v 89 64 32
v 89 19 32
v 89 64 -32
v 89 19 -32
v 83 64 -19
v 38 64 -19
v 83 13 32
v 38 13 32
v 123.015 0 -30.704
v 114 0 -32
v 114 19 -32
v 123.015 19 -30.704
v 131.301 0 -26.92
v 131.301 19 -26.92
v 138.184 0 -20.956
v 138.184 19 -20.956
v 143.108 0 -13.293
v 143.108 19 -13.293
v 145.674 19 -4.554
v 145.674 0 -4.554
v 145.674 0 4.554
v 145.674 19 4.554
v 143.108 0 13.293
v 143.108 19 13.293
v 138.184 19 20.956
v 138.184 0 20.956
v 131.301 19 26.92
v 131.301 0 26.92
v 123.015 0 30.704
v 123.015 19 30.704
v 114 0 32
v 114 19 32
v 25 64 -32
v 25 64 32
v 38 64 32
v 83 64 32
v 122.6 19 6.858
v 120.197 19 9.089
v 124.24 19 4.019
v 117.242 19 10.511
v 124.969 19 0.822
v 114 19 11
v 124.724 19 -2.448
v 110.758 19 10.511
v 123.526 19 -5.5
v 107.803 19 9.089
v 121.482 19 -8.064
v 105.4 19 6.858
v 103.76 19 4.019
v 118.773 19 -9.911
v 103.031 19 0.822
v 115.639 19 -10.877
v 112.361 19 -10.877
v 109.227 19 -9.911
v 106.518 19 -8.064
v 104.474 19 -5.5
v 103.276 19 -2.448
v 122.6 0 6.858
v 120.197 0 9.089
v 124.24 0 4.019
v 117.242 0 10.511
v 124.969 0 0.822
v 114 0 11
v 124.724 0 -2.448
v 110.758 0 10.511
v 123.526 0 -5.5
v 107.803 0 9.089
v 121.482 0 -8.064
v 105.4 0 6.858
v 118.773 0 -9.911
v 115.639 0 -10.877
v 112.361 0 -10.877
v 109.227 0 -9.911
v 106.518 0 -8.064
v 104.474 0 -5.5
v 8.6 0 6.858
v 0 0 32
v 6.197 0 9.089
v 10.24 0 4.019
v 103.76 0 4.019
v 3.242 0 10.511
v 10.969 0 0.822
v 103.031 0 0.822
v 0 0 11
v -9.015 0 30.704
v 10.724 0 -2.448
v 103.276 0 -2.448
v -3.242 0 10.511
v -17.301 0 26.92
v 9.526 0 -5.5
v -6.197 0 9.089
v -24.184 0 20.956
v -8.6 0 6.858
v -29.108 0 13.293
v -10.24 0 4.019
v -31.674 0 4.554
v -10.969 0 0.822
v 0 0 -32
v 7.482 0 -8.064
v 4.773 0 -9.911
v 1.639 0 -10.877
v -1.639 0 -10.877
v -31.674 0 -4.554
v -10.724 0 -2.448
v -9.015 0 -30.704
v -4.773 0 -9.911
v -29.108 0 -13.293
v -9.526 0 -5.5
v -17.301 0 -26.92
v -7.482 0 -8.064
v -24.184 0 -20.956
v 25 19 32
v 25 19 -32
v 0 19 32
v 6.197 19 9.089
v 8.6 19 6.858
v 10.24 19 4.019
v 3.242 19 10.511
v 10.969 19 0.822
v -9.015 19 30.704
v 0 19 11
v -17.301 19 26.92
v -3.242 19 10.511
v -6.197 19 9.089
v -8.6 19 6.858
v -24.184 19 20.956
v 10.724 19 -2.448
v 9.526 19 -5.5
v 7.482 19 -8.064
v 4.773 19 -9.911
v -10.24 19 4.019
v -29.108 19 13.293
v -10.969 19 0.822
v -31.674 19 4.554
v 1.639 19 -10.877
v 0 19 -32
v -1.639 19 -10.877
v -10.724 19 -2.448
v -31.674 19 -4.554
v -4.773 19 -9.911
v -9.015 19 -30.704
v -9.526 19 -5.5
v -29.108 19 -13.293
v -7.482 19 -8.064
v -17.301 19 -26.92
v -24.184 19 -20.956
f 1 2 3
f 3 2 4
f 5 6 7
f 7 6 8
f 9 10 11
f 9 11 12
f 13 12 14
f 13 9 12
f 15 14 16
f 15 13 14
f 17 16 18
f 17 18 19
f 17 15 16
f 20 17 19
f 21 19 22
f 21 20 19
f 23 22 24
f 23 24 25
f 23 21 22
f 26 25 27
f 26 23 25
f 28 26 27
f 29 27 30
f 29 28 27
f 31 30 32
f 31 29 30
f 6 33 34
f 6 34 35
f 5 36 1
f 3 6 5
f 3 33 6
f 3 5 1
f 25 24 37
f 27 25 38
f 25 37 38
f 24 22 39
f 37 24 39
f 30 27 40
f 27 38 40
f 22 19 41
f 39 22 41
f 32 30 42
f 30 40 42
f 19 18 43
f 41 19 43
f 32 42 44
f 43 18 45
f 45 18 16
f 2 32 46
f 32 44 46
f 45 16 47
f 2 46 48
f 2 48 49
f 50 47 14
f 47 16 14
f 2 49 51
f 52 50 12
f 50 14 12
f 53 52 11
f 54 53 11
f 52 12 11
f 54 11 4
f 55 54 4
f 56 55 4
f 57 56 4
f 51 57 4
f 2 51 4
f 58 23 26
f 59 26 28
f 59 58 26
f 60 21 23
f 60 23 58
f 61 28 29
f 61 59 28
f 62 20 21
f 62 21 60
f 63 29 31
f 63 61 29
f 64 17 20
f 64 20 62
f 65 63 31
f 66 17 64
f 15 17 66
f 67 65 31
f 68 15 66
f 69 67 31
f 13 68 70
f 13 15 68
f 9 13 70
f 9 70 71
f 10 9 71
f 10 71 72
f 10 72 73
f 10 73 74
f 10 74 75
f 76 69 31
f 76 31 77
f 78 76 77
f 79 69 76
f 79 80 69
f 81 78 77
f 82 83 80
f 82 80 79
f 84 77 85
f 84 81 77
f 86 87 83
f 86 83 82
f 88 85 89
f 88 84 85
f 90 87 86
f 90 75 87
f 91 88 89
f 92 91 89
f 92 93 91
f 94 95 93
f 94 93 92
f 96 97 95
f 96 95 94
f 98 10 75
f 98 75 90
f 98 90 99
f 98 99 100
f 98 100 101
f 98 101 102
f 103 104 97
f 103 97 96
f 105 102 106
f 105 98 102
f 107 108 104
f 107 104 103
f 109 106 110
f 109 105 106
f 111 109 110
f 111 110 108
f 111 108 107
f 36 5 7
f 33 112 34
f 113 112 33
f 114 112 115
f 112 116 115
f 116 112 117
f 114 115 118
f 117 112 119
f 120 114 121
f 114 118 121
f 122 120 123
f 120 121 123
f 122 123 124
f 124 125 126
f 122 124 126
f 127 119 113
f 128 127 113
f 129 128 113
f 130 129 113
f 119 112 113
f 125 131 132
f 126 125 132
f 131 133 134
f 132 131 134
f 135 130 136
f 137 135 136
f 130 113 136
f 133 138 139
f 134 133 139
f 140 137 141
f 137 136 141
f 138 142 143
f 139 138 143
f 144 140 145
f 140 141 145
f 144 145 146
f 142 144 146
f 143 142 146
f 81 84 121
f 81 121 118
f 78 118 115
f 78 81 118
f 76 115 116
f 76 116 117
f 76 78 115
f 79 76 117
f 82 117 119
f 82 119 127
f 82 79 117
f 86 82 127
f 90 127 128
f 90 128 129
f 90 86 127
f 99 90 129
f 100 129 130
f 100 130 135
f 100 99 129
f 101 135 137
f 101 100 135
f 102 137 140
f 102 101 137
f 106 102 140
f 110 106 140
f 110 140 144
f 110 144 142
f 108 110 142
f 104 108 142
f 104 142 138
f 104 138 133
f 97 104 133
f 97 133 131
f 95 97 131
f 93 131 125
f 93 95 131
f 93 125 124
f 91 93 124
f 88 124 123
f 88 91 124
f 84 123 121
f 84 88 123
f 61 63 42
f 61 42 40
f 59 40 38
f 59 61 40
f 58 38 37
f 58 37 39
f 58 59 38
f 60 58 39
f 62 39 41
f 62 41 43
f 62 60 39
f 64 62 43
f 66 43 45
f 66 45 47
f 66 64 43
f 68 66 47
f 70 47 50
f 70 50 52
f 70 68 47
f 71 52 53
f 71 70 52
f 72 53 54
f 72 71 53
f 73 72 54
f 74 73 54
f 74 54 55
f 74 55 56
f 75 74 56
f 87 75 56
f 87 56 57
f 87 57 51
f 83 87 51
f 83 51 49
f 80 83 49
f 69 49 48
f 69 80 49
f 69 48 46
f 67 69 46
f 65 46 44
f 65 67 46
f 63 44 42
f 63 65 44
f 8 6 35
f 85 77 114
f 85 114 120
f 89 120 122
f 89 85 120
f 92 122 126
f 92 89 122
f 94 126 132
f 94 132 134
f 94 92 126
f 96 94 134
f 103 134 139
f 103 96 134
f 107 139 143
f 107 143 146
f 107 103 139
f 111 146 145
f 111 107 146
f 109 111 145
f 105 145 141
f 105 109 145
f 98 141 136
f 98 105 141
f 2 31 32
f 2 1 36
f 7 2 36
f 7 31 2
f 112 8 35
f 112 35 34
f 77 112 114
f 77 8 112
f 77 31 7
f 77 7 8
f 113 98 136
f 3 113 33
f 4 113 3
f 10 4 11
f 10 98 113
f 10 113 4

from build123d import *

# Parameters (mm, degrees)
SKETCH1_R           = 11
BOSS_EXTRUDE1_DEPTH = 19
SKETCH2_W           = 64
SKETCH2_H           = 64
BOSS_EXTRUDE2_DEPTH = 45
CUT_EXTRUDE2_START  = -13
CUT_EXTRUDE2_DEPTH  = 45


with BuildPart() as part:
    # Sketch1 → Boss-Extrude1 (new body)
    with BuildSketch(Plane(origin=(0, 0, 0), x_dir=(1, 0, 0), z_dir=(0, 1, 0))):
        with BuildLine():
            Line((0, 32), (114, 32))
            ThreePointArc((114, 32), (146, 0), (114, -32))
            Line((114, -32), (0, -32))
            ThreePointArc((0, -32), (-32, 0), (0, 32))
        make_face()
        with Locations(Location((0, 0, 0), (0, 0, 270))):
            Circle(SKETCH1_R, mode=Mode.SUBTRACT)
        with Locations(Location((114, 0, 0), (0, 0, 270))):
            Circle(SKETCH1_R, mode=Mode.SUBTRACT)
    extrude(amount=BOSS_EXTRUDE1_DEPTH)

    # Sketch2 → Boss-Extrude2 (add)
    with BuildSketch(Plane(origin=(0, 19, 0), x_dir=(1, 0, 0), z_dir=(0, 1, 0))):
        with Locations((57, 0)):
            Rectangle(SKETCH2_W, SKETCH2_H)
    extrude(amount=BOSS_EXTRUDE2_DEPTH)

    # Sketch3 → Cut-Extrude2 (cut)
    with BuildSketch(Plane.ZY.offset(-25).offset(CUT_EXTRUDE2_START)):
        Polygon((32, 64), (-19, 64), (32, 13), align=None)
    extrude(amount=-CUT_EXTRUDE2_DEPTH, mode=Mode.SUBTRACT)


solid = part.part
